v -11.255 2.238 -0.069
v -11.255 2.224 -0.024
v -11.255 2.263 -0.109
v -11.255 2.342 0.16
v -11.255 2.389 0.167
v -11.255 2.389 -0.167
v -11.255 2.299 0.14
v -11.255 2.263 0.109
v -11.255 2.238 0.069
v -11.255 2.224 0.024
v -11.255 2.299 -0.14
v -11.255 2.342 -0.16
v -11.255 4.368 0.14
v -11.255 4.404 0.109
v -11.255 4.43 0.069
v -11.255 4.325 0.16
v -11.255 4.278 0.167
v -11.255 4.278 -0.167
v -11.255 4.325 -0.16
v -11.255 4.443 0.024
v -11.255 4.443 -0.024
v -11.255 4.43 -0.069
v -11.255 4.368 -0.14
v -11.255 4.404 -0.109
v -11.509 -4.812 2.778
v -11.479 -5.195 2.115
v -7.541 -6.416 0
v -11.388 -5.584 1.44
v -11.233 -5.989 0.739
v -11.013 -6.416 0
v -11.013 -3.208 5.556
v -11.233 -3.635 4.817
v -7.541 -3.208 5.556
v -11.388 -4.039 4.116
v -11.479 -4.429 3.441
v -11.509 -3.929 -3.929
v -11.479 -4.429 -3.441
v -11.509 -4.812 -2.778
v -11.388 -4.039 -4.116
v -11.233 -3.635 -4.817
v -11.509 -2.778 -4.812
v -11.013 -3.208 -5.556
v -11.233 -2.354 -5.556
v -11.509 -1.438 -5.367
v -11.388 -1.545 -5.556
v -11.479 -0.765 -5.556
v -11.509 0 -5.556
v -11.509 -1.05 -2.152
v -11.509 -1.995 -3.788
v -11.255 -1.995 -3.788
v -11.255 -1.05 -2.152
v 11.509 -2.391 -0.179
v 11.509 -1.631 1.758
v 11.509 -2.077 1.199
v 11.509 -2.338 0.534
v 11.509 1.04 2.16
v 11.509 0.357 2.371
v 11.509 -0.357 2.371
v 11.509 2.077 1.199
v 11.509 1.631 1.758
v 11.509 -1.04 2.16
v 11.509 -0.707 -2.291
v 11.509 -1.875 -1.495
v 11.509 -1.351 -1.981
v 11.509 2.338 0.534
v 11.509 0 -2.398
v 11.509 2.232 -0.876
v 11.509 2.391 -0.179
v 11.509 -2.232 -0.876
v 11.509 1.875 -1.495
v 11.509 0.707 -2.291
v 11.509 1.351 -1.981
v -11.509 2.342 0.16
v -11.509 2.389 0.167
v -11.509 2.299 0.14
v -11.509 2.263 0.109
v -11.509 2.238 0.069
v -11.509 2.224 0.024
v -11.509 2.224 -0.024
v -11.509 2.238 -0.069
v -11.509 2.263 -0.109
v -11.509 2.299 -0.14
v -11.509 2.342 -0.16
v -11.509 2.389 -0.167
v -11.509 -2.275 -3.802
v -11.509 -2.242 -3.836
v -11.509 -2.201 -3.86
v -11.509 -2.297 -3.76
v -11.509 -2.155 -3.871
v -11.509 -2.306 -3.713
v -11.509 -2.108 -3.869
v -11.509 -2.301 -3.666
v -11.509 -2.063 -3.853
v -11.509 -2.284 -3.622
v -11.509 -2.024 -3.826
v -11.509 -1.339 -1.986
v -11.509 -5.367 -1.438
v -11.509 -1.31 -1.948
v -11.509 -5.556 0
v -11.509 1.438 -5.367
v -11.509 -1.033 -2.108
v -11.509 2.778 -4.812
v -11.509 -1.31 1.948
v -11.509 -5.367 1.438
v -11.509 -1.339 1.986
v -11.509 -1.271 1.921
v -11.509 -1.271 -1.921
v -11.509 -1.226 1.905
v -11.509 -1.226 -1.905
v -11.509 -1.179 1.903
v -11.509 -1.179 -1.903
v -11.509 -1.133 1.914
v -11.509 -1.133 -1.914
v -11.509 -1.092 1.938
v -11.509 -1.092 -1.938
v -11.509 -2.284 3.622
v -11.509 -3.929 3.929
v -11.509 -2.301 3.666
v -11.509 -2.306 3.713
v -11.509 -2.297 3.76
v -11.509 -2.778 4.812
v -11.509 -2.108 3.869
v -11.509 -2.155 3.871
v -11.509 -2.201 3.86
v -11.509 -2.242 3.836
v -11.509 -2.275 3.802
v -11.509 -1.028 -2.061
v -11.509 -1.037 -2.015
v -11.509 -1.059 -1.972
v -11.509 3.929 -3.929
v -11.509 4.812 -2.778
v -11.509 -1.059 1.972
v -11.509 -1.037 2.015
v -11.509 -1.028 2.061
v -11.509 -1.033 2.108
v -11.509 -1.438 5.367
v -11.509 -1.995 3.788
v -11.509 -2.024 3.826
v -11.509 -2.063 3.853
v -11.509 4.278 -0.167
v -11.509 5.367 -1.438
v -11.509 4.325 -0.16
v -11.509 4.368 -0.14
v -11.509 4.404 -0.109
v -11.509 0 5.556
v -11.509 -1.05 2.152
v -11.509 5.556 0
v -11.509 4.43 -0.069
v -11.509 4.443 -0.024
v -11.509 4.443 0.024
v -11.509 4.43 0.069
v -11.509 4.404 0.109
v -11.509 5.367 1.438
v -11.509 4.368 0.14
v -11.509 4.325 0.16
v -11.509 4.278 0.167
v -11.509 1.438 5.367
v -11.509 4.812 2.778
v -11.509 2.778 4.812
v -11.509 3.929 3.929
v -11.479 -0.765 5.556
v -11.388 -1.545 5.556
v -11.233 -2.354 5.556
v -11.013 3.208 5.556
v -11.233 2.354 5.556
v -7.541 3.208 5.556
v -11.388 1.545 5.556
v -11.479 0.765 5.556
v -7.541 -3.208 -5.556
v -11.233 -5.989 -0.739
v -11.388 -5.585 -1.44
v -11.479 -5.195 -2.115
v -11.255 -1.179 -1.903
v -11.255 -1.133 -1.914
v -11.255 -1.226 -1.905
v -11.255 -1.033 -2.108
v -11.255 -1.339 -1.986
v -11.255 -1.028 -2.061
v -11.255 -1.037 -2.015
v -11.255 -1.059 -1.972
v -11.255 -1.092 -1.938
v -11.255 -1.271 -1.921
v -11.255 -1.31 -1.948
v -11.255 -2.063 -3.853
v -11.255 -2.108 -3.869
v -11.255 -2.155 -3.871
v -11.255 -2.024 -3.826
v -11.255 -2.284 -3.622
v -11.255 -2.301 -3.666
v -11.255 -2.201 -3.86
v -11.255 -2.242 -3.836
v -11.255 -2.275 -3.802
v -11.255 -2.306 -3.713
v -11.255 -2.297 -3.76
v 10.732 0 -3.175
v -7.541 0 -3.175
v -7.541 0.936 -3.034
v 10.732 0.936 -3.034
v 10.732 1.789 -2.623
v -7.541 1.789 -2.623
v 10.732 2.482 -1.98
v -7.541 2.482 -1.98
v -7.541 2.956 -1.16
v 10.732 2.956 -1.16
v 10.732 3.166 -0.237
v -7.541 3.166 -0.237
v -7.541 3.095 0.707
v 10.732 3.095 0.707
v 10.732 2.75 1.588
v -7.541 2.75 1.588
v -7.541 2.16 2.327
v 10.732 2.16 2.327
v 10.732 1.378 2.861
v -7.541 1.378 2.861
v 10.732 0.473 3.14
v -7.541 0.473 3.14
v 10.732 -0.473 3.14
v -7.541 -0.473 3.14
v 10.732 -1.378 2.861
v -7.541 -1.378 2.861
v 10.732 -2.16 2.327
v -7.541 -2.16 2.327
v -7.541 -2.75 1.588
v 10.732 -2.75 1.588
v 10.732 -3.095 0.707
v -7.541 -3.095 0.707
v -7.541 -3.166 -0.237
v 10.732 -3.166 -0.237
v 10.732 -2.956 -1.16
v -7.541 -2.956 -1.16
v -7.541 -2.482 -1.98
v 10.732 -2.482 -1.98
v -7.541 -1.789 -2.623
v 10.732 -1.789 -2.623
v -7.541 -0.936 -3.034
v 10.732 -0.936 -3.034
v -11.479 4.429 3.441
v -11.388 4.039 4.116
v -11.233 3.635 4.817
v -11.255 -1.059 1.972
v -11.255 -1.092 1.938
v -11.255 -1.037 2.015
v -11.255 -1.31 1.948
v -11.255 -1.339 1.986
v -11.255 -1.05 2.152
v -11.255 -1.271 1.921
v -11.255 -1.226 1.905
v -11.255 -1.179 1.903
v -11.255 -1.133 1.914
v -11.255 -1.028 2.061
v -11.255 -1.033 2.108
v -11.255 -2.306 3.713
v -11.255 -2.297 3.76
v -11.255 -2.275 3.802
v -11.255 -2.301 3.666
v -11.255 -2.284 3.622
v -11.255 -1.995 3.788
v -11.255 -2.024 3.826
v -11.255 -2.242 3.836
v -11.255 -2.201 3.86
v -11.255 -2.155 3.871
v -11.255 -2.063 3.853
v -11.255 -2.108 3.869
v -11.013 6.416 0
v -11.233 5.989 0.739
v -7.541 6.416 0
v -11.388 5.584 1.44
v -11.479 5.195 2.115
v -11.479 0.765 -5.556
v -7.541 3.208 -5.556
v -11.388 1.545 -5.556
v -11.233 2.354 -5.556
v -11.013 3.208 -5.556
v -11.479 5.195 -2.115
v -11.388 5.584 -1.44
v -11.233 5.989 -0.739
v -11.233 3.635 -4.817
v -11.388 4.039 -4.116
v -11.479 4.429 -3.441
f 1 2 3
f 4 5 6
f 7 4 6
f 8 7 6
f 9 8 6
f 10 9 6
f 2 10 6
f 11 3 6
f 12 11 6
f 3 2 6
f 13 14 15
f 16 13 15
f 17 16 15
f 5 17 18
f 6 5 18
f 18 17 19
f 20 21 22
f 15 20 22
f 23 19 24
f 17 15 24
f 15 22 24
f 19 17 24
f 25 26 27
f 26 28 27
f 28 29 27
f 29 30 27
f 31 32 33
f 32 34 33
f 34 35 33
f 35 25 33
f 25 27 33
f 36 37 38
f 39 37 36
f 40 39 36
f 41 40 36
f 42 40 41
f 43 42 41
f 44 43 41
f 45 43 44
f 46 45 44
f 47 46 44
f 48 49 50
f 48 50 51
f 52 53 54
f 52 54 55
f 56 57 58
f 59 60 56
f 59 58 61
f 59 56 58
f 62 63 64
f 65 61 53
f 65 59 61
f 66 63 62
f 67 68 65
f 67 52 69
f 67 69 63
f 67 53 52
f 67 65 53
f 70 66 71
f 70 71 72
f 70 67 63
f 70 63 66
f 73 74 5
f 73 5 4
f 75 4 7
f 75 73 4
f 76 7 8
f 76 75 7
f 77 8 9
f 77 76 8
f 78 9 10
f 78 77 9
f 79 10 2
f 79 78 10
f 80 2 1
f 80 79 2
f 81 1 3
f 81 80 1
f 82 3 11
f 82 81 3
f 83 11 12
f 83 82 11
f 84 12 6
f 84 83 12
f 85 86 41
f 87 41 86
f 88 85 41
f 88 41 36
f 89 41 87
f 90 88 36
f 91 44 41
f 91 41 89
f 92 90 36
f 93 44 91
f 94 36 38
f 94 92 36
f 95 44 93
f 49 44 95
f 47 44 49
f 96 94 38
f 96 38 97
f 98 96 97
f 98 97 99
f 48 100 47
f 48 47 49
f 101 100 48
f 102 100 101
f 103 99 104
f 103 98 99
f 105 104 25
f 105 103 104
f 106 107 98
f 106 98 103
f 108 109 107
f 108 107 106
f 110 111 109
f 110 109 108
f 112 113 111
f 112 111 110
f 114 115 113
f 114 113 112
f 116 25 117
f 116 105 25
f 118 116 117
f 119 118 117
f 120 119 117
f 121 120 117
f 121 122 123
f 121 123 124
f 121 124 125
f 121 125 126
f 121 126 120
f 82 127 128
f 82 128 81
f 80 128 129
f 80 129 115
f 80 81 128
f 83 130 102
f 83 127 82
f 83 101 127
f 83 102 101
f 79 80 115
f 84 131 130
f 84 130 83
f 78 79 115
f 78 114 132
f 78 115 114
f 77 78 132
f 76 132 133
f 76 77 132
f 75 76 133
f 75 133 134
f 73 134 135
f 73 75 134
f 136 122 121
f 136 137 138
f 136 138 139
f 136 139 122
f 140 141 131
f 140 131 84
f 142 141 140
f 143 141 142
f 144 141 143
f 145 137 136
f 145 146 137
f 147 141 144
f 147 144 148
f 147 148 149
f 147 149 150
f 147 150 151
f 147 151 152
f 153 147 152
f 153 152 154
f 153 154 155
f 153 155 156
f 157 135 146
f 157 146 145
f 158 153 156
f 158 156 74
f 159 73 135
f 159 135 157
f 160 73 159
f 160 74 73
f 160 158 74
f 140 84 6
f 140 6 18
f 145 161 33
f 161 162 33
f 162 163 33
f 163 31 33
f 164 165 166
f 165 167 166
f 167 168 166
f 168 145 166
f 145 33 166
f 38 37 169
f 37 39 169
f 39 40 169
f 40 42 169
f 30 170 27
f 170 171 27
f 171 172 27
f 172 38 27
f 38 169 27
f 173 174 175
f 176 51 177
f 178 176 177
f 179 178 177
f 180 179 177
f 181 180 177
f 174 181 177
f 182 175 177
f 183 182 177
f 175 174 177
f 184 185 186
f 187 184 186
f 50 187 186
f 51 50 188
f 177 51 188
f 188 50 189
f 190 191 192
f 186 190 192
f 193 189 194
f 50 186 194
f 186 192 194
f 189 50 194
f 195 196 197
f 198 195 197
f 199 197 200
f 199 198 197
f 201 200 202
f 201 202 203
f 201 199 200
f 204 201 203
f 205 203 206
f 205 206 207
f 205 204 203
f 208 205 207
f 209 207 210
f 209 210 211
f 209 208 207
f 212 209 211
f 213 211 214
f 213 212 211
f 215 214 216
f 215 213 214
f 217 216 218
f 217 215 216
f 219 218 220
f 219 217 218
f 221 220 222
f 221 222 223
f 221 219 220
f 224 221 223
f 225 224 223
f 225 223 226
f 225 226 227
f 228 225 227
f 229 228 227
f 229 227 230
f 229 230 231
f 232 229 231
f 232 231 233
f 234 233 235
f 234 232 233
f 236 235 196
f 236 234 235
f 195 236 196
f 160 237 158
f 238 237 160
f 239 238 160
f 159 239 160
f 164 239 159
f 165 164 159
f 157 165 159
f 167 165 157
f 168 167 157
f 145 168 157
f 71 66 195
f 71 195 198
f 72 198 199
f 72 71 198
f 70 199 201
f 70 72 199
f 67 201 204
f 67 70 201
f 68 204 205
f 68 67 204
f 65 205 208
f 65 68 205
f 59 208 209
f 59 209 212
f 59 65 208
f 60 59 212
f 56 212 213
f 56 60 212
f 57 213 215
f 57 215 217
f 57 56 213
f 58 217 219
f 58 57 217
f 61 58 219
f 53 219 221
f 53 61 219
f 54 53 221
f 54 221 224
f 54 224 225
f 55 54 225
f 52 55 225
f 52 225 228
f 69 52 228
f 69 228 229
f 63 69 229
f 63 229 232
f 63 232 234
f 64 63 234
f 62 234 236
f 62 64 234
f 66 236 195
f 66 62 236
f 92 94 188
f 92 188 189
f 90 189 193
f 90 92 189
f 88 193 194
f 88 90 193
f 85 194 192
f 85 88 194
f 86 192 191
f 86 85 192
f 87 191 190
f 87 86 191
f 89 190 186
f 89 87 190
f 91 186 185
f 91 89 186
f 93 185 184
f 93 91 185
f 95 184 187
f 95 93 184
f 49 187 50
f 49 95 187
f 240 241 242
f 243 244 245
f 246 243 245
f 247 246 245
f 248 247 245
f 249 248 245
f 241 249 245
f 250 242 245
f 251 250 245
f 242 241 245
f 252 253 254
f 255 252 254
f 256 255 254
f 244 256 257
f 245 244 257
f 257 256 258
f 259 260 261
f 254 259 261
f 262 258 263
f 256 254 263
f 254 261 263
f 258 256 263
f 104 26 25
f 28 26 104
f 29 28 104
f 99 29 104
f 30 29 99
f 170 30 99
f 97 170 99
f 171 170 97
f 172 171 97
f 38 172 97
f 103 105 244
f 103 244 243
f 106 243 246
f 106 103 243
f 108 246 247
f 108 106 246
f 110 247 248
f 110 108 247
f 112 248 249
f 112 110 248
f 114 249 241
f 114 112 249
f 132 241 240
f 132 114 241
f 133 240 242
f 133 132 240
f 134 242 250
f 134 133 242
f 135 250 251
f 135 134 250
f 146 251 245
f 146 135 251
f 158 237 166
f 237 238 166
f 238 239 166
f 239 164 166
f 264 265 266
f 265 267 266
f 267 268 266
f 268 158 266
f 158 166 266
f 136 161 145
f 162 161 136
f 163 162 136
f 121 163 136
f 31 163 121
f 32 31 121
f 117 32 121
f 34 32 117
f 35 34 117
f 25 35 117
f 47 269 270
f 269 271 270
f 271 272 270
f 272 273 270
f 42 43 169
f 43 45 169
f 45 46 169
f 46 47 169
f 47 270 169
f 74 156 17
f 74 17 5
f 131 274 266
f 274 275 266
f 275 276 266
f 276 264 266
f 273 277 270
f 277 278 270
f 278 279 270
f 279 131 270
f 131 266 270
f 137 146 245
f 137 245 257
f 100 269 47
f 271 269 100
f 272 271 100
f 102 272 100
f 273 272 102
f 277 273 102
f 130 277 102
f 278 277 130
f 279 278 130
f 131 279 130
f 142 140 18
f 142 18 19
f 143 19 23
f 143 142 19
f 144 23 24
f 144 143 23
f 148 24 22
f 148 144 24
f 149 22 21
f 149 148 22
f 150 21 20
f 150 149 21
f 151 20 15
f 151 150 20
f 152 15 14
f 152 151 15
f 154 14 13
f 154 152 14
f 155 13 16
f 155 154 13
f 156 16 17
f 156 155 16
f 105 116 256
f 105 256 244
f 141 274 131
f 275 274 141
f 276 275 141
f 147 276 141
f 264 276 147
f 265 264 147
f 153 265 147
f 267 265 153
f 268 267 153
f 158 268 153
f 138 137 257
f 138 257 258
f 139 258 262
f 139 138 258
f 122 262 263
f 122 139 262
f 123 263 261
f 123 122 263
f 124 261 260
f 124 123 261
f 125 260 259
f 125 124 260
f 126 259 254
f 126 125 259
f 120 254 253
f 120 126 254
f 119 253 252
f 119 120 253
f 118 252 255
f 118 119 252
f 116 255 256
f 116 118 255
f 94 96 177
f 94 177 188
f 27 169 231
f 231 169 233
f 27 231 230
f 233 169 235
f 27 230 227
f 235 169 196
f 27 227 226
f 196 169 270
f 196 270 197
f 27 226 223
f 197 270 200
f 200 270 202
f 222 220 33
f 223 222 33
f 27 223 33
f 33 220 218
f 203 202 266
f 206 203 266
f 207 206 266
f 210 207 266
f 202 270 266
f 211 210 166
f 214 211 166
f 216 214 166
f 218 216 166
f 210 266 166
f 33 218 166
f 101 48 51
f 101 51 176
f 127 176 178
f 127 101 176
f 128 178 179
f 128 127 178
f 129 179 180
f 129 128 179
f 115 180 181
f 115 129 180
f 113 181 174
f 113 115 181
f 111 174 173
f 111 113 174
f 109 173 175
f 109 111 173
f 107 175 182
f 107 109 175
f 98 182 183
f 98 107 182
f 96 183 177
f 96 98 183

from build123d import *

# Parameters (mm, degrees)
SKETCH5_R           = 3.175
BOSS_EXTRUDE3_DEPTH = 19.05
CHAMFER1_SIZE       = 0.77724
BOSS_EXTRUDE4_DEPTH = 3.96875
SKETCH8_OUTSIDE_W   = 102.036
SKETCH8_OUTSIDE_H   = 103.756
SKETCH8_OUTSIDE_R   = 5.55625
CUT_EXTRUDE3_DEPTH  = 24.01875
CUT_EXTRUDE3_TAPER  = 60
CUT_EXTRUDE4_DEPTH  = 0.254
CIRPATTERN1_COUNT   = 3


with BuildPart() as part:
    # Sketch5 → Boss-Extrude3 (new body)
    with BuildSketch(Plane(origin=(11.509375, 0, 0), x_dir=(0, 0, -1), z_dir=(1, 0, 0))):
        Circle(SKETCH5_R)
    extrude(amount=-BOSS_EXTRUDE3_DEPTH)

    # Chamfer1
    chamfer1_edges = [part.edges().sort_by_distance(p)[0] for p in [
        (11.509375, 0, 3.175),
    ]]
    chamfer(chamfer1_edges, length=CHAMFER1_SIZE)

    # Sketch6 → Boss-Extrude4 (add)
    with BuildSketch(Plane.ZY.offset(7.540625)):
        Polygon((5.55625, 3.207902433), (0, 6.415804866), (-5.55625, 3.207902433), (-5.55625, -3.207902433), (0, -6.415804866), (5.55625, -3.207902433), align=None)
    extrude(amount=BOSS_EXTRUDE4_DEPTH)

    # Sketch8 outside → Cut-Extrude3 (cut, through all)
    with BuildSketch(Plane.ZY.offset(11.509375)):
        Rectangle(SKETCH8_OUTSIDE_W, SKETCH8_OUTSIDE_H)
        Circle(SKETCH8_OUTSIDE_R, mode=Mode.SUBTRACT)
    extrude(amount=-CUT_EXTRUDE3_DEPTH, taper=CUT_EXTRUDE3_TAPER, mode=Mode.SUBTRACT)

    # Sketch12 → Cut-Extrude4 (cut)
    with BuildSketch(Plane.ZY.offset(11.509375)):
        with BuildLine():
            Line((0.1666875, 4.2783125), (0.1666875, 2.3891875))
            ThreePointArc((0.1666875, 2.3891875), (0, 2.2225), (-0.1666875, 2.3891875))
            Line((-0.1666875, 2.3891875), (-0.1666875, 4.2783125))
            ThreePointArc((-0.1666875, 4.2783125), (0, 4.445), (0.1666875, 4.2783125))
        make_face()
    cut_extrude4 = extrude(amount=-CUT_EXTRUDE4_DEPTH, mode=Mode.SUBTRACT)

    # CirPattern1: Cut-Extrude4 ×3 about axis
    cirpattern1_axis = Axis((0, 0, 0), (1, 0, 0))
    for i in range(1, CIRPATTERN1_COUNT):
        add(cut_extrude4.rotate(cirpattern1_axis, i * 360 / CIRPATTERN1_COUNT), mode=Mode.SUBTRACT)


solid = part.part
